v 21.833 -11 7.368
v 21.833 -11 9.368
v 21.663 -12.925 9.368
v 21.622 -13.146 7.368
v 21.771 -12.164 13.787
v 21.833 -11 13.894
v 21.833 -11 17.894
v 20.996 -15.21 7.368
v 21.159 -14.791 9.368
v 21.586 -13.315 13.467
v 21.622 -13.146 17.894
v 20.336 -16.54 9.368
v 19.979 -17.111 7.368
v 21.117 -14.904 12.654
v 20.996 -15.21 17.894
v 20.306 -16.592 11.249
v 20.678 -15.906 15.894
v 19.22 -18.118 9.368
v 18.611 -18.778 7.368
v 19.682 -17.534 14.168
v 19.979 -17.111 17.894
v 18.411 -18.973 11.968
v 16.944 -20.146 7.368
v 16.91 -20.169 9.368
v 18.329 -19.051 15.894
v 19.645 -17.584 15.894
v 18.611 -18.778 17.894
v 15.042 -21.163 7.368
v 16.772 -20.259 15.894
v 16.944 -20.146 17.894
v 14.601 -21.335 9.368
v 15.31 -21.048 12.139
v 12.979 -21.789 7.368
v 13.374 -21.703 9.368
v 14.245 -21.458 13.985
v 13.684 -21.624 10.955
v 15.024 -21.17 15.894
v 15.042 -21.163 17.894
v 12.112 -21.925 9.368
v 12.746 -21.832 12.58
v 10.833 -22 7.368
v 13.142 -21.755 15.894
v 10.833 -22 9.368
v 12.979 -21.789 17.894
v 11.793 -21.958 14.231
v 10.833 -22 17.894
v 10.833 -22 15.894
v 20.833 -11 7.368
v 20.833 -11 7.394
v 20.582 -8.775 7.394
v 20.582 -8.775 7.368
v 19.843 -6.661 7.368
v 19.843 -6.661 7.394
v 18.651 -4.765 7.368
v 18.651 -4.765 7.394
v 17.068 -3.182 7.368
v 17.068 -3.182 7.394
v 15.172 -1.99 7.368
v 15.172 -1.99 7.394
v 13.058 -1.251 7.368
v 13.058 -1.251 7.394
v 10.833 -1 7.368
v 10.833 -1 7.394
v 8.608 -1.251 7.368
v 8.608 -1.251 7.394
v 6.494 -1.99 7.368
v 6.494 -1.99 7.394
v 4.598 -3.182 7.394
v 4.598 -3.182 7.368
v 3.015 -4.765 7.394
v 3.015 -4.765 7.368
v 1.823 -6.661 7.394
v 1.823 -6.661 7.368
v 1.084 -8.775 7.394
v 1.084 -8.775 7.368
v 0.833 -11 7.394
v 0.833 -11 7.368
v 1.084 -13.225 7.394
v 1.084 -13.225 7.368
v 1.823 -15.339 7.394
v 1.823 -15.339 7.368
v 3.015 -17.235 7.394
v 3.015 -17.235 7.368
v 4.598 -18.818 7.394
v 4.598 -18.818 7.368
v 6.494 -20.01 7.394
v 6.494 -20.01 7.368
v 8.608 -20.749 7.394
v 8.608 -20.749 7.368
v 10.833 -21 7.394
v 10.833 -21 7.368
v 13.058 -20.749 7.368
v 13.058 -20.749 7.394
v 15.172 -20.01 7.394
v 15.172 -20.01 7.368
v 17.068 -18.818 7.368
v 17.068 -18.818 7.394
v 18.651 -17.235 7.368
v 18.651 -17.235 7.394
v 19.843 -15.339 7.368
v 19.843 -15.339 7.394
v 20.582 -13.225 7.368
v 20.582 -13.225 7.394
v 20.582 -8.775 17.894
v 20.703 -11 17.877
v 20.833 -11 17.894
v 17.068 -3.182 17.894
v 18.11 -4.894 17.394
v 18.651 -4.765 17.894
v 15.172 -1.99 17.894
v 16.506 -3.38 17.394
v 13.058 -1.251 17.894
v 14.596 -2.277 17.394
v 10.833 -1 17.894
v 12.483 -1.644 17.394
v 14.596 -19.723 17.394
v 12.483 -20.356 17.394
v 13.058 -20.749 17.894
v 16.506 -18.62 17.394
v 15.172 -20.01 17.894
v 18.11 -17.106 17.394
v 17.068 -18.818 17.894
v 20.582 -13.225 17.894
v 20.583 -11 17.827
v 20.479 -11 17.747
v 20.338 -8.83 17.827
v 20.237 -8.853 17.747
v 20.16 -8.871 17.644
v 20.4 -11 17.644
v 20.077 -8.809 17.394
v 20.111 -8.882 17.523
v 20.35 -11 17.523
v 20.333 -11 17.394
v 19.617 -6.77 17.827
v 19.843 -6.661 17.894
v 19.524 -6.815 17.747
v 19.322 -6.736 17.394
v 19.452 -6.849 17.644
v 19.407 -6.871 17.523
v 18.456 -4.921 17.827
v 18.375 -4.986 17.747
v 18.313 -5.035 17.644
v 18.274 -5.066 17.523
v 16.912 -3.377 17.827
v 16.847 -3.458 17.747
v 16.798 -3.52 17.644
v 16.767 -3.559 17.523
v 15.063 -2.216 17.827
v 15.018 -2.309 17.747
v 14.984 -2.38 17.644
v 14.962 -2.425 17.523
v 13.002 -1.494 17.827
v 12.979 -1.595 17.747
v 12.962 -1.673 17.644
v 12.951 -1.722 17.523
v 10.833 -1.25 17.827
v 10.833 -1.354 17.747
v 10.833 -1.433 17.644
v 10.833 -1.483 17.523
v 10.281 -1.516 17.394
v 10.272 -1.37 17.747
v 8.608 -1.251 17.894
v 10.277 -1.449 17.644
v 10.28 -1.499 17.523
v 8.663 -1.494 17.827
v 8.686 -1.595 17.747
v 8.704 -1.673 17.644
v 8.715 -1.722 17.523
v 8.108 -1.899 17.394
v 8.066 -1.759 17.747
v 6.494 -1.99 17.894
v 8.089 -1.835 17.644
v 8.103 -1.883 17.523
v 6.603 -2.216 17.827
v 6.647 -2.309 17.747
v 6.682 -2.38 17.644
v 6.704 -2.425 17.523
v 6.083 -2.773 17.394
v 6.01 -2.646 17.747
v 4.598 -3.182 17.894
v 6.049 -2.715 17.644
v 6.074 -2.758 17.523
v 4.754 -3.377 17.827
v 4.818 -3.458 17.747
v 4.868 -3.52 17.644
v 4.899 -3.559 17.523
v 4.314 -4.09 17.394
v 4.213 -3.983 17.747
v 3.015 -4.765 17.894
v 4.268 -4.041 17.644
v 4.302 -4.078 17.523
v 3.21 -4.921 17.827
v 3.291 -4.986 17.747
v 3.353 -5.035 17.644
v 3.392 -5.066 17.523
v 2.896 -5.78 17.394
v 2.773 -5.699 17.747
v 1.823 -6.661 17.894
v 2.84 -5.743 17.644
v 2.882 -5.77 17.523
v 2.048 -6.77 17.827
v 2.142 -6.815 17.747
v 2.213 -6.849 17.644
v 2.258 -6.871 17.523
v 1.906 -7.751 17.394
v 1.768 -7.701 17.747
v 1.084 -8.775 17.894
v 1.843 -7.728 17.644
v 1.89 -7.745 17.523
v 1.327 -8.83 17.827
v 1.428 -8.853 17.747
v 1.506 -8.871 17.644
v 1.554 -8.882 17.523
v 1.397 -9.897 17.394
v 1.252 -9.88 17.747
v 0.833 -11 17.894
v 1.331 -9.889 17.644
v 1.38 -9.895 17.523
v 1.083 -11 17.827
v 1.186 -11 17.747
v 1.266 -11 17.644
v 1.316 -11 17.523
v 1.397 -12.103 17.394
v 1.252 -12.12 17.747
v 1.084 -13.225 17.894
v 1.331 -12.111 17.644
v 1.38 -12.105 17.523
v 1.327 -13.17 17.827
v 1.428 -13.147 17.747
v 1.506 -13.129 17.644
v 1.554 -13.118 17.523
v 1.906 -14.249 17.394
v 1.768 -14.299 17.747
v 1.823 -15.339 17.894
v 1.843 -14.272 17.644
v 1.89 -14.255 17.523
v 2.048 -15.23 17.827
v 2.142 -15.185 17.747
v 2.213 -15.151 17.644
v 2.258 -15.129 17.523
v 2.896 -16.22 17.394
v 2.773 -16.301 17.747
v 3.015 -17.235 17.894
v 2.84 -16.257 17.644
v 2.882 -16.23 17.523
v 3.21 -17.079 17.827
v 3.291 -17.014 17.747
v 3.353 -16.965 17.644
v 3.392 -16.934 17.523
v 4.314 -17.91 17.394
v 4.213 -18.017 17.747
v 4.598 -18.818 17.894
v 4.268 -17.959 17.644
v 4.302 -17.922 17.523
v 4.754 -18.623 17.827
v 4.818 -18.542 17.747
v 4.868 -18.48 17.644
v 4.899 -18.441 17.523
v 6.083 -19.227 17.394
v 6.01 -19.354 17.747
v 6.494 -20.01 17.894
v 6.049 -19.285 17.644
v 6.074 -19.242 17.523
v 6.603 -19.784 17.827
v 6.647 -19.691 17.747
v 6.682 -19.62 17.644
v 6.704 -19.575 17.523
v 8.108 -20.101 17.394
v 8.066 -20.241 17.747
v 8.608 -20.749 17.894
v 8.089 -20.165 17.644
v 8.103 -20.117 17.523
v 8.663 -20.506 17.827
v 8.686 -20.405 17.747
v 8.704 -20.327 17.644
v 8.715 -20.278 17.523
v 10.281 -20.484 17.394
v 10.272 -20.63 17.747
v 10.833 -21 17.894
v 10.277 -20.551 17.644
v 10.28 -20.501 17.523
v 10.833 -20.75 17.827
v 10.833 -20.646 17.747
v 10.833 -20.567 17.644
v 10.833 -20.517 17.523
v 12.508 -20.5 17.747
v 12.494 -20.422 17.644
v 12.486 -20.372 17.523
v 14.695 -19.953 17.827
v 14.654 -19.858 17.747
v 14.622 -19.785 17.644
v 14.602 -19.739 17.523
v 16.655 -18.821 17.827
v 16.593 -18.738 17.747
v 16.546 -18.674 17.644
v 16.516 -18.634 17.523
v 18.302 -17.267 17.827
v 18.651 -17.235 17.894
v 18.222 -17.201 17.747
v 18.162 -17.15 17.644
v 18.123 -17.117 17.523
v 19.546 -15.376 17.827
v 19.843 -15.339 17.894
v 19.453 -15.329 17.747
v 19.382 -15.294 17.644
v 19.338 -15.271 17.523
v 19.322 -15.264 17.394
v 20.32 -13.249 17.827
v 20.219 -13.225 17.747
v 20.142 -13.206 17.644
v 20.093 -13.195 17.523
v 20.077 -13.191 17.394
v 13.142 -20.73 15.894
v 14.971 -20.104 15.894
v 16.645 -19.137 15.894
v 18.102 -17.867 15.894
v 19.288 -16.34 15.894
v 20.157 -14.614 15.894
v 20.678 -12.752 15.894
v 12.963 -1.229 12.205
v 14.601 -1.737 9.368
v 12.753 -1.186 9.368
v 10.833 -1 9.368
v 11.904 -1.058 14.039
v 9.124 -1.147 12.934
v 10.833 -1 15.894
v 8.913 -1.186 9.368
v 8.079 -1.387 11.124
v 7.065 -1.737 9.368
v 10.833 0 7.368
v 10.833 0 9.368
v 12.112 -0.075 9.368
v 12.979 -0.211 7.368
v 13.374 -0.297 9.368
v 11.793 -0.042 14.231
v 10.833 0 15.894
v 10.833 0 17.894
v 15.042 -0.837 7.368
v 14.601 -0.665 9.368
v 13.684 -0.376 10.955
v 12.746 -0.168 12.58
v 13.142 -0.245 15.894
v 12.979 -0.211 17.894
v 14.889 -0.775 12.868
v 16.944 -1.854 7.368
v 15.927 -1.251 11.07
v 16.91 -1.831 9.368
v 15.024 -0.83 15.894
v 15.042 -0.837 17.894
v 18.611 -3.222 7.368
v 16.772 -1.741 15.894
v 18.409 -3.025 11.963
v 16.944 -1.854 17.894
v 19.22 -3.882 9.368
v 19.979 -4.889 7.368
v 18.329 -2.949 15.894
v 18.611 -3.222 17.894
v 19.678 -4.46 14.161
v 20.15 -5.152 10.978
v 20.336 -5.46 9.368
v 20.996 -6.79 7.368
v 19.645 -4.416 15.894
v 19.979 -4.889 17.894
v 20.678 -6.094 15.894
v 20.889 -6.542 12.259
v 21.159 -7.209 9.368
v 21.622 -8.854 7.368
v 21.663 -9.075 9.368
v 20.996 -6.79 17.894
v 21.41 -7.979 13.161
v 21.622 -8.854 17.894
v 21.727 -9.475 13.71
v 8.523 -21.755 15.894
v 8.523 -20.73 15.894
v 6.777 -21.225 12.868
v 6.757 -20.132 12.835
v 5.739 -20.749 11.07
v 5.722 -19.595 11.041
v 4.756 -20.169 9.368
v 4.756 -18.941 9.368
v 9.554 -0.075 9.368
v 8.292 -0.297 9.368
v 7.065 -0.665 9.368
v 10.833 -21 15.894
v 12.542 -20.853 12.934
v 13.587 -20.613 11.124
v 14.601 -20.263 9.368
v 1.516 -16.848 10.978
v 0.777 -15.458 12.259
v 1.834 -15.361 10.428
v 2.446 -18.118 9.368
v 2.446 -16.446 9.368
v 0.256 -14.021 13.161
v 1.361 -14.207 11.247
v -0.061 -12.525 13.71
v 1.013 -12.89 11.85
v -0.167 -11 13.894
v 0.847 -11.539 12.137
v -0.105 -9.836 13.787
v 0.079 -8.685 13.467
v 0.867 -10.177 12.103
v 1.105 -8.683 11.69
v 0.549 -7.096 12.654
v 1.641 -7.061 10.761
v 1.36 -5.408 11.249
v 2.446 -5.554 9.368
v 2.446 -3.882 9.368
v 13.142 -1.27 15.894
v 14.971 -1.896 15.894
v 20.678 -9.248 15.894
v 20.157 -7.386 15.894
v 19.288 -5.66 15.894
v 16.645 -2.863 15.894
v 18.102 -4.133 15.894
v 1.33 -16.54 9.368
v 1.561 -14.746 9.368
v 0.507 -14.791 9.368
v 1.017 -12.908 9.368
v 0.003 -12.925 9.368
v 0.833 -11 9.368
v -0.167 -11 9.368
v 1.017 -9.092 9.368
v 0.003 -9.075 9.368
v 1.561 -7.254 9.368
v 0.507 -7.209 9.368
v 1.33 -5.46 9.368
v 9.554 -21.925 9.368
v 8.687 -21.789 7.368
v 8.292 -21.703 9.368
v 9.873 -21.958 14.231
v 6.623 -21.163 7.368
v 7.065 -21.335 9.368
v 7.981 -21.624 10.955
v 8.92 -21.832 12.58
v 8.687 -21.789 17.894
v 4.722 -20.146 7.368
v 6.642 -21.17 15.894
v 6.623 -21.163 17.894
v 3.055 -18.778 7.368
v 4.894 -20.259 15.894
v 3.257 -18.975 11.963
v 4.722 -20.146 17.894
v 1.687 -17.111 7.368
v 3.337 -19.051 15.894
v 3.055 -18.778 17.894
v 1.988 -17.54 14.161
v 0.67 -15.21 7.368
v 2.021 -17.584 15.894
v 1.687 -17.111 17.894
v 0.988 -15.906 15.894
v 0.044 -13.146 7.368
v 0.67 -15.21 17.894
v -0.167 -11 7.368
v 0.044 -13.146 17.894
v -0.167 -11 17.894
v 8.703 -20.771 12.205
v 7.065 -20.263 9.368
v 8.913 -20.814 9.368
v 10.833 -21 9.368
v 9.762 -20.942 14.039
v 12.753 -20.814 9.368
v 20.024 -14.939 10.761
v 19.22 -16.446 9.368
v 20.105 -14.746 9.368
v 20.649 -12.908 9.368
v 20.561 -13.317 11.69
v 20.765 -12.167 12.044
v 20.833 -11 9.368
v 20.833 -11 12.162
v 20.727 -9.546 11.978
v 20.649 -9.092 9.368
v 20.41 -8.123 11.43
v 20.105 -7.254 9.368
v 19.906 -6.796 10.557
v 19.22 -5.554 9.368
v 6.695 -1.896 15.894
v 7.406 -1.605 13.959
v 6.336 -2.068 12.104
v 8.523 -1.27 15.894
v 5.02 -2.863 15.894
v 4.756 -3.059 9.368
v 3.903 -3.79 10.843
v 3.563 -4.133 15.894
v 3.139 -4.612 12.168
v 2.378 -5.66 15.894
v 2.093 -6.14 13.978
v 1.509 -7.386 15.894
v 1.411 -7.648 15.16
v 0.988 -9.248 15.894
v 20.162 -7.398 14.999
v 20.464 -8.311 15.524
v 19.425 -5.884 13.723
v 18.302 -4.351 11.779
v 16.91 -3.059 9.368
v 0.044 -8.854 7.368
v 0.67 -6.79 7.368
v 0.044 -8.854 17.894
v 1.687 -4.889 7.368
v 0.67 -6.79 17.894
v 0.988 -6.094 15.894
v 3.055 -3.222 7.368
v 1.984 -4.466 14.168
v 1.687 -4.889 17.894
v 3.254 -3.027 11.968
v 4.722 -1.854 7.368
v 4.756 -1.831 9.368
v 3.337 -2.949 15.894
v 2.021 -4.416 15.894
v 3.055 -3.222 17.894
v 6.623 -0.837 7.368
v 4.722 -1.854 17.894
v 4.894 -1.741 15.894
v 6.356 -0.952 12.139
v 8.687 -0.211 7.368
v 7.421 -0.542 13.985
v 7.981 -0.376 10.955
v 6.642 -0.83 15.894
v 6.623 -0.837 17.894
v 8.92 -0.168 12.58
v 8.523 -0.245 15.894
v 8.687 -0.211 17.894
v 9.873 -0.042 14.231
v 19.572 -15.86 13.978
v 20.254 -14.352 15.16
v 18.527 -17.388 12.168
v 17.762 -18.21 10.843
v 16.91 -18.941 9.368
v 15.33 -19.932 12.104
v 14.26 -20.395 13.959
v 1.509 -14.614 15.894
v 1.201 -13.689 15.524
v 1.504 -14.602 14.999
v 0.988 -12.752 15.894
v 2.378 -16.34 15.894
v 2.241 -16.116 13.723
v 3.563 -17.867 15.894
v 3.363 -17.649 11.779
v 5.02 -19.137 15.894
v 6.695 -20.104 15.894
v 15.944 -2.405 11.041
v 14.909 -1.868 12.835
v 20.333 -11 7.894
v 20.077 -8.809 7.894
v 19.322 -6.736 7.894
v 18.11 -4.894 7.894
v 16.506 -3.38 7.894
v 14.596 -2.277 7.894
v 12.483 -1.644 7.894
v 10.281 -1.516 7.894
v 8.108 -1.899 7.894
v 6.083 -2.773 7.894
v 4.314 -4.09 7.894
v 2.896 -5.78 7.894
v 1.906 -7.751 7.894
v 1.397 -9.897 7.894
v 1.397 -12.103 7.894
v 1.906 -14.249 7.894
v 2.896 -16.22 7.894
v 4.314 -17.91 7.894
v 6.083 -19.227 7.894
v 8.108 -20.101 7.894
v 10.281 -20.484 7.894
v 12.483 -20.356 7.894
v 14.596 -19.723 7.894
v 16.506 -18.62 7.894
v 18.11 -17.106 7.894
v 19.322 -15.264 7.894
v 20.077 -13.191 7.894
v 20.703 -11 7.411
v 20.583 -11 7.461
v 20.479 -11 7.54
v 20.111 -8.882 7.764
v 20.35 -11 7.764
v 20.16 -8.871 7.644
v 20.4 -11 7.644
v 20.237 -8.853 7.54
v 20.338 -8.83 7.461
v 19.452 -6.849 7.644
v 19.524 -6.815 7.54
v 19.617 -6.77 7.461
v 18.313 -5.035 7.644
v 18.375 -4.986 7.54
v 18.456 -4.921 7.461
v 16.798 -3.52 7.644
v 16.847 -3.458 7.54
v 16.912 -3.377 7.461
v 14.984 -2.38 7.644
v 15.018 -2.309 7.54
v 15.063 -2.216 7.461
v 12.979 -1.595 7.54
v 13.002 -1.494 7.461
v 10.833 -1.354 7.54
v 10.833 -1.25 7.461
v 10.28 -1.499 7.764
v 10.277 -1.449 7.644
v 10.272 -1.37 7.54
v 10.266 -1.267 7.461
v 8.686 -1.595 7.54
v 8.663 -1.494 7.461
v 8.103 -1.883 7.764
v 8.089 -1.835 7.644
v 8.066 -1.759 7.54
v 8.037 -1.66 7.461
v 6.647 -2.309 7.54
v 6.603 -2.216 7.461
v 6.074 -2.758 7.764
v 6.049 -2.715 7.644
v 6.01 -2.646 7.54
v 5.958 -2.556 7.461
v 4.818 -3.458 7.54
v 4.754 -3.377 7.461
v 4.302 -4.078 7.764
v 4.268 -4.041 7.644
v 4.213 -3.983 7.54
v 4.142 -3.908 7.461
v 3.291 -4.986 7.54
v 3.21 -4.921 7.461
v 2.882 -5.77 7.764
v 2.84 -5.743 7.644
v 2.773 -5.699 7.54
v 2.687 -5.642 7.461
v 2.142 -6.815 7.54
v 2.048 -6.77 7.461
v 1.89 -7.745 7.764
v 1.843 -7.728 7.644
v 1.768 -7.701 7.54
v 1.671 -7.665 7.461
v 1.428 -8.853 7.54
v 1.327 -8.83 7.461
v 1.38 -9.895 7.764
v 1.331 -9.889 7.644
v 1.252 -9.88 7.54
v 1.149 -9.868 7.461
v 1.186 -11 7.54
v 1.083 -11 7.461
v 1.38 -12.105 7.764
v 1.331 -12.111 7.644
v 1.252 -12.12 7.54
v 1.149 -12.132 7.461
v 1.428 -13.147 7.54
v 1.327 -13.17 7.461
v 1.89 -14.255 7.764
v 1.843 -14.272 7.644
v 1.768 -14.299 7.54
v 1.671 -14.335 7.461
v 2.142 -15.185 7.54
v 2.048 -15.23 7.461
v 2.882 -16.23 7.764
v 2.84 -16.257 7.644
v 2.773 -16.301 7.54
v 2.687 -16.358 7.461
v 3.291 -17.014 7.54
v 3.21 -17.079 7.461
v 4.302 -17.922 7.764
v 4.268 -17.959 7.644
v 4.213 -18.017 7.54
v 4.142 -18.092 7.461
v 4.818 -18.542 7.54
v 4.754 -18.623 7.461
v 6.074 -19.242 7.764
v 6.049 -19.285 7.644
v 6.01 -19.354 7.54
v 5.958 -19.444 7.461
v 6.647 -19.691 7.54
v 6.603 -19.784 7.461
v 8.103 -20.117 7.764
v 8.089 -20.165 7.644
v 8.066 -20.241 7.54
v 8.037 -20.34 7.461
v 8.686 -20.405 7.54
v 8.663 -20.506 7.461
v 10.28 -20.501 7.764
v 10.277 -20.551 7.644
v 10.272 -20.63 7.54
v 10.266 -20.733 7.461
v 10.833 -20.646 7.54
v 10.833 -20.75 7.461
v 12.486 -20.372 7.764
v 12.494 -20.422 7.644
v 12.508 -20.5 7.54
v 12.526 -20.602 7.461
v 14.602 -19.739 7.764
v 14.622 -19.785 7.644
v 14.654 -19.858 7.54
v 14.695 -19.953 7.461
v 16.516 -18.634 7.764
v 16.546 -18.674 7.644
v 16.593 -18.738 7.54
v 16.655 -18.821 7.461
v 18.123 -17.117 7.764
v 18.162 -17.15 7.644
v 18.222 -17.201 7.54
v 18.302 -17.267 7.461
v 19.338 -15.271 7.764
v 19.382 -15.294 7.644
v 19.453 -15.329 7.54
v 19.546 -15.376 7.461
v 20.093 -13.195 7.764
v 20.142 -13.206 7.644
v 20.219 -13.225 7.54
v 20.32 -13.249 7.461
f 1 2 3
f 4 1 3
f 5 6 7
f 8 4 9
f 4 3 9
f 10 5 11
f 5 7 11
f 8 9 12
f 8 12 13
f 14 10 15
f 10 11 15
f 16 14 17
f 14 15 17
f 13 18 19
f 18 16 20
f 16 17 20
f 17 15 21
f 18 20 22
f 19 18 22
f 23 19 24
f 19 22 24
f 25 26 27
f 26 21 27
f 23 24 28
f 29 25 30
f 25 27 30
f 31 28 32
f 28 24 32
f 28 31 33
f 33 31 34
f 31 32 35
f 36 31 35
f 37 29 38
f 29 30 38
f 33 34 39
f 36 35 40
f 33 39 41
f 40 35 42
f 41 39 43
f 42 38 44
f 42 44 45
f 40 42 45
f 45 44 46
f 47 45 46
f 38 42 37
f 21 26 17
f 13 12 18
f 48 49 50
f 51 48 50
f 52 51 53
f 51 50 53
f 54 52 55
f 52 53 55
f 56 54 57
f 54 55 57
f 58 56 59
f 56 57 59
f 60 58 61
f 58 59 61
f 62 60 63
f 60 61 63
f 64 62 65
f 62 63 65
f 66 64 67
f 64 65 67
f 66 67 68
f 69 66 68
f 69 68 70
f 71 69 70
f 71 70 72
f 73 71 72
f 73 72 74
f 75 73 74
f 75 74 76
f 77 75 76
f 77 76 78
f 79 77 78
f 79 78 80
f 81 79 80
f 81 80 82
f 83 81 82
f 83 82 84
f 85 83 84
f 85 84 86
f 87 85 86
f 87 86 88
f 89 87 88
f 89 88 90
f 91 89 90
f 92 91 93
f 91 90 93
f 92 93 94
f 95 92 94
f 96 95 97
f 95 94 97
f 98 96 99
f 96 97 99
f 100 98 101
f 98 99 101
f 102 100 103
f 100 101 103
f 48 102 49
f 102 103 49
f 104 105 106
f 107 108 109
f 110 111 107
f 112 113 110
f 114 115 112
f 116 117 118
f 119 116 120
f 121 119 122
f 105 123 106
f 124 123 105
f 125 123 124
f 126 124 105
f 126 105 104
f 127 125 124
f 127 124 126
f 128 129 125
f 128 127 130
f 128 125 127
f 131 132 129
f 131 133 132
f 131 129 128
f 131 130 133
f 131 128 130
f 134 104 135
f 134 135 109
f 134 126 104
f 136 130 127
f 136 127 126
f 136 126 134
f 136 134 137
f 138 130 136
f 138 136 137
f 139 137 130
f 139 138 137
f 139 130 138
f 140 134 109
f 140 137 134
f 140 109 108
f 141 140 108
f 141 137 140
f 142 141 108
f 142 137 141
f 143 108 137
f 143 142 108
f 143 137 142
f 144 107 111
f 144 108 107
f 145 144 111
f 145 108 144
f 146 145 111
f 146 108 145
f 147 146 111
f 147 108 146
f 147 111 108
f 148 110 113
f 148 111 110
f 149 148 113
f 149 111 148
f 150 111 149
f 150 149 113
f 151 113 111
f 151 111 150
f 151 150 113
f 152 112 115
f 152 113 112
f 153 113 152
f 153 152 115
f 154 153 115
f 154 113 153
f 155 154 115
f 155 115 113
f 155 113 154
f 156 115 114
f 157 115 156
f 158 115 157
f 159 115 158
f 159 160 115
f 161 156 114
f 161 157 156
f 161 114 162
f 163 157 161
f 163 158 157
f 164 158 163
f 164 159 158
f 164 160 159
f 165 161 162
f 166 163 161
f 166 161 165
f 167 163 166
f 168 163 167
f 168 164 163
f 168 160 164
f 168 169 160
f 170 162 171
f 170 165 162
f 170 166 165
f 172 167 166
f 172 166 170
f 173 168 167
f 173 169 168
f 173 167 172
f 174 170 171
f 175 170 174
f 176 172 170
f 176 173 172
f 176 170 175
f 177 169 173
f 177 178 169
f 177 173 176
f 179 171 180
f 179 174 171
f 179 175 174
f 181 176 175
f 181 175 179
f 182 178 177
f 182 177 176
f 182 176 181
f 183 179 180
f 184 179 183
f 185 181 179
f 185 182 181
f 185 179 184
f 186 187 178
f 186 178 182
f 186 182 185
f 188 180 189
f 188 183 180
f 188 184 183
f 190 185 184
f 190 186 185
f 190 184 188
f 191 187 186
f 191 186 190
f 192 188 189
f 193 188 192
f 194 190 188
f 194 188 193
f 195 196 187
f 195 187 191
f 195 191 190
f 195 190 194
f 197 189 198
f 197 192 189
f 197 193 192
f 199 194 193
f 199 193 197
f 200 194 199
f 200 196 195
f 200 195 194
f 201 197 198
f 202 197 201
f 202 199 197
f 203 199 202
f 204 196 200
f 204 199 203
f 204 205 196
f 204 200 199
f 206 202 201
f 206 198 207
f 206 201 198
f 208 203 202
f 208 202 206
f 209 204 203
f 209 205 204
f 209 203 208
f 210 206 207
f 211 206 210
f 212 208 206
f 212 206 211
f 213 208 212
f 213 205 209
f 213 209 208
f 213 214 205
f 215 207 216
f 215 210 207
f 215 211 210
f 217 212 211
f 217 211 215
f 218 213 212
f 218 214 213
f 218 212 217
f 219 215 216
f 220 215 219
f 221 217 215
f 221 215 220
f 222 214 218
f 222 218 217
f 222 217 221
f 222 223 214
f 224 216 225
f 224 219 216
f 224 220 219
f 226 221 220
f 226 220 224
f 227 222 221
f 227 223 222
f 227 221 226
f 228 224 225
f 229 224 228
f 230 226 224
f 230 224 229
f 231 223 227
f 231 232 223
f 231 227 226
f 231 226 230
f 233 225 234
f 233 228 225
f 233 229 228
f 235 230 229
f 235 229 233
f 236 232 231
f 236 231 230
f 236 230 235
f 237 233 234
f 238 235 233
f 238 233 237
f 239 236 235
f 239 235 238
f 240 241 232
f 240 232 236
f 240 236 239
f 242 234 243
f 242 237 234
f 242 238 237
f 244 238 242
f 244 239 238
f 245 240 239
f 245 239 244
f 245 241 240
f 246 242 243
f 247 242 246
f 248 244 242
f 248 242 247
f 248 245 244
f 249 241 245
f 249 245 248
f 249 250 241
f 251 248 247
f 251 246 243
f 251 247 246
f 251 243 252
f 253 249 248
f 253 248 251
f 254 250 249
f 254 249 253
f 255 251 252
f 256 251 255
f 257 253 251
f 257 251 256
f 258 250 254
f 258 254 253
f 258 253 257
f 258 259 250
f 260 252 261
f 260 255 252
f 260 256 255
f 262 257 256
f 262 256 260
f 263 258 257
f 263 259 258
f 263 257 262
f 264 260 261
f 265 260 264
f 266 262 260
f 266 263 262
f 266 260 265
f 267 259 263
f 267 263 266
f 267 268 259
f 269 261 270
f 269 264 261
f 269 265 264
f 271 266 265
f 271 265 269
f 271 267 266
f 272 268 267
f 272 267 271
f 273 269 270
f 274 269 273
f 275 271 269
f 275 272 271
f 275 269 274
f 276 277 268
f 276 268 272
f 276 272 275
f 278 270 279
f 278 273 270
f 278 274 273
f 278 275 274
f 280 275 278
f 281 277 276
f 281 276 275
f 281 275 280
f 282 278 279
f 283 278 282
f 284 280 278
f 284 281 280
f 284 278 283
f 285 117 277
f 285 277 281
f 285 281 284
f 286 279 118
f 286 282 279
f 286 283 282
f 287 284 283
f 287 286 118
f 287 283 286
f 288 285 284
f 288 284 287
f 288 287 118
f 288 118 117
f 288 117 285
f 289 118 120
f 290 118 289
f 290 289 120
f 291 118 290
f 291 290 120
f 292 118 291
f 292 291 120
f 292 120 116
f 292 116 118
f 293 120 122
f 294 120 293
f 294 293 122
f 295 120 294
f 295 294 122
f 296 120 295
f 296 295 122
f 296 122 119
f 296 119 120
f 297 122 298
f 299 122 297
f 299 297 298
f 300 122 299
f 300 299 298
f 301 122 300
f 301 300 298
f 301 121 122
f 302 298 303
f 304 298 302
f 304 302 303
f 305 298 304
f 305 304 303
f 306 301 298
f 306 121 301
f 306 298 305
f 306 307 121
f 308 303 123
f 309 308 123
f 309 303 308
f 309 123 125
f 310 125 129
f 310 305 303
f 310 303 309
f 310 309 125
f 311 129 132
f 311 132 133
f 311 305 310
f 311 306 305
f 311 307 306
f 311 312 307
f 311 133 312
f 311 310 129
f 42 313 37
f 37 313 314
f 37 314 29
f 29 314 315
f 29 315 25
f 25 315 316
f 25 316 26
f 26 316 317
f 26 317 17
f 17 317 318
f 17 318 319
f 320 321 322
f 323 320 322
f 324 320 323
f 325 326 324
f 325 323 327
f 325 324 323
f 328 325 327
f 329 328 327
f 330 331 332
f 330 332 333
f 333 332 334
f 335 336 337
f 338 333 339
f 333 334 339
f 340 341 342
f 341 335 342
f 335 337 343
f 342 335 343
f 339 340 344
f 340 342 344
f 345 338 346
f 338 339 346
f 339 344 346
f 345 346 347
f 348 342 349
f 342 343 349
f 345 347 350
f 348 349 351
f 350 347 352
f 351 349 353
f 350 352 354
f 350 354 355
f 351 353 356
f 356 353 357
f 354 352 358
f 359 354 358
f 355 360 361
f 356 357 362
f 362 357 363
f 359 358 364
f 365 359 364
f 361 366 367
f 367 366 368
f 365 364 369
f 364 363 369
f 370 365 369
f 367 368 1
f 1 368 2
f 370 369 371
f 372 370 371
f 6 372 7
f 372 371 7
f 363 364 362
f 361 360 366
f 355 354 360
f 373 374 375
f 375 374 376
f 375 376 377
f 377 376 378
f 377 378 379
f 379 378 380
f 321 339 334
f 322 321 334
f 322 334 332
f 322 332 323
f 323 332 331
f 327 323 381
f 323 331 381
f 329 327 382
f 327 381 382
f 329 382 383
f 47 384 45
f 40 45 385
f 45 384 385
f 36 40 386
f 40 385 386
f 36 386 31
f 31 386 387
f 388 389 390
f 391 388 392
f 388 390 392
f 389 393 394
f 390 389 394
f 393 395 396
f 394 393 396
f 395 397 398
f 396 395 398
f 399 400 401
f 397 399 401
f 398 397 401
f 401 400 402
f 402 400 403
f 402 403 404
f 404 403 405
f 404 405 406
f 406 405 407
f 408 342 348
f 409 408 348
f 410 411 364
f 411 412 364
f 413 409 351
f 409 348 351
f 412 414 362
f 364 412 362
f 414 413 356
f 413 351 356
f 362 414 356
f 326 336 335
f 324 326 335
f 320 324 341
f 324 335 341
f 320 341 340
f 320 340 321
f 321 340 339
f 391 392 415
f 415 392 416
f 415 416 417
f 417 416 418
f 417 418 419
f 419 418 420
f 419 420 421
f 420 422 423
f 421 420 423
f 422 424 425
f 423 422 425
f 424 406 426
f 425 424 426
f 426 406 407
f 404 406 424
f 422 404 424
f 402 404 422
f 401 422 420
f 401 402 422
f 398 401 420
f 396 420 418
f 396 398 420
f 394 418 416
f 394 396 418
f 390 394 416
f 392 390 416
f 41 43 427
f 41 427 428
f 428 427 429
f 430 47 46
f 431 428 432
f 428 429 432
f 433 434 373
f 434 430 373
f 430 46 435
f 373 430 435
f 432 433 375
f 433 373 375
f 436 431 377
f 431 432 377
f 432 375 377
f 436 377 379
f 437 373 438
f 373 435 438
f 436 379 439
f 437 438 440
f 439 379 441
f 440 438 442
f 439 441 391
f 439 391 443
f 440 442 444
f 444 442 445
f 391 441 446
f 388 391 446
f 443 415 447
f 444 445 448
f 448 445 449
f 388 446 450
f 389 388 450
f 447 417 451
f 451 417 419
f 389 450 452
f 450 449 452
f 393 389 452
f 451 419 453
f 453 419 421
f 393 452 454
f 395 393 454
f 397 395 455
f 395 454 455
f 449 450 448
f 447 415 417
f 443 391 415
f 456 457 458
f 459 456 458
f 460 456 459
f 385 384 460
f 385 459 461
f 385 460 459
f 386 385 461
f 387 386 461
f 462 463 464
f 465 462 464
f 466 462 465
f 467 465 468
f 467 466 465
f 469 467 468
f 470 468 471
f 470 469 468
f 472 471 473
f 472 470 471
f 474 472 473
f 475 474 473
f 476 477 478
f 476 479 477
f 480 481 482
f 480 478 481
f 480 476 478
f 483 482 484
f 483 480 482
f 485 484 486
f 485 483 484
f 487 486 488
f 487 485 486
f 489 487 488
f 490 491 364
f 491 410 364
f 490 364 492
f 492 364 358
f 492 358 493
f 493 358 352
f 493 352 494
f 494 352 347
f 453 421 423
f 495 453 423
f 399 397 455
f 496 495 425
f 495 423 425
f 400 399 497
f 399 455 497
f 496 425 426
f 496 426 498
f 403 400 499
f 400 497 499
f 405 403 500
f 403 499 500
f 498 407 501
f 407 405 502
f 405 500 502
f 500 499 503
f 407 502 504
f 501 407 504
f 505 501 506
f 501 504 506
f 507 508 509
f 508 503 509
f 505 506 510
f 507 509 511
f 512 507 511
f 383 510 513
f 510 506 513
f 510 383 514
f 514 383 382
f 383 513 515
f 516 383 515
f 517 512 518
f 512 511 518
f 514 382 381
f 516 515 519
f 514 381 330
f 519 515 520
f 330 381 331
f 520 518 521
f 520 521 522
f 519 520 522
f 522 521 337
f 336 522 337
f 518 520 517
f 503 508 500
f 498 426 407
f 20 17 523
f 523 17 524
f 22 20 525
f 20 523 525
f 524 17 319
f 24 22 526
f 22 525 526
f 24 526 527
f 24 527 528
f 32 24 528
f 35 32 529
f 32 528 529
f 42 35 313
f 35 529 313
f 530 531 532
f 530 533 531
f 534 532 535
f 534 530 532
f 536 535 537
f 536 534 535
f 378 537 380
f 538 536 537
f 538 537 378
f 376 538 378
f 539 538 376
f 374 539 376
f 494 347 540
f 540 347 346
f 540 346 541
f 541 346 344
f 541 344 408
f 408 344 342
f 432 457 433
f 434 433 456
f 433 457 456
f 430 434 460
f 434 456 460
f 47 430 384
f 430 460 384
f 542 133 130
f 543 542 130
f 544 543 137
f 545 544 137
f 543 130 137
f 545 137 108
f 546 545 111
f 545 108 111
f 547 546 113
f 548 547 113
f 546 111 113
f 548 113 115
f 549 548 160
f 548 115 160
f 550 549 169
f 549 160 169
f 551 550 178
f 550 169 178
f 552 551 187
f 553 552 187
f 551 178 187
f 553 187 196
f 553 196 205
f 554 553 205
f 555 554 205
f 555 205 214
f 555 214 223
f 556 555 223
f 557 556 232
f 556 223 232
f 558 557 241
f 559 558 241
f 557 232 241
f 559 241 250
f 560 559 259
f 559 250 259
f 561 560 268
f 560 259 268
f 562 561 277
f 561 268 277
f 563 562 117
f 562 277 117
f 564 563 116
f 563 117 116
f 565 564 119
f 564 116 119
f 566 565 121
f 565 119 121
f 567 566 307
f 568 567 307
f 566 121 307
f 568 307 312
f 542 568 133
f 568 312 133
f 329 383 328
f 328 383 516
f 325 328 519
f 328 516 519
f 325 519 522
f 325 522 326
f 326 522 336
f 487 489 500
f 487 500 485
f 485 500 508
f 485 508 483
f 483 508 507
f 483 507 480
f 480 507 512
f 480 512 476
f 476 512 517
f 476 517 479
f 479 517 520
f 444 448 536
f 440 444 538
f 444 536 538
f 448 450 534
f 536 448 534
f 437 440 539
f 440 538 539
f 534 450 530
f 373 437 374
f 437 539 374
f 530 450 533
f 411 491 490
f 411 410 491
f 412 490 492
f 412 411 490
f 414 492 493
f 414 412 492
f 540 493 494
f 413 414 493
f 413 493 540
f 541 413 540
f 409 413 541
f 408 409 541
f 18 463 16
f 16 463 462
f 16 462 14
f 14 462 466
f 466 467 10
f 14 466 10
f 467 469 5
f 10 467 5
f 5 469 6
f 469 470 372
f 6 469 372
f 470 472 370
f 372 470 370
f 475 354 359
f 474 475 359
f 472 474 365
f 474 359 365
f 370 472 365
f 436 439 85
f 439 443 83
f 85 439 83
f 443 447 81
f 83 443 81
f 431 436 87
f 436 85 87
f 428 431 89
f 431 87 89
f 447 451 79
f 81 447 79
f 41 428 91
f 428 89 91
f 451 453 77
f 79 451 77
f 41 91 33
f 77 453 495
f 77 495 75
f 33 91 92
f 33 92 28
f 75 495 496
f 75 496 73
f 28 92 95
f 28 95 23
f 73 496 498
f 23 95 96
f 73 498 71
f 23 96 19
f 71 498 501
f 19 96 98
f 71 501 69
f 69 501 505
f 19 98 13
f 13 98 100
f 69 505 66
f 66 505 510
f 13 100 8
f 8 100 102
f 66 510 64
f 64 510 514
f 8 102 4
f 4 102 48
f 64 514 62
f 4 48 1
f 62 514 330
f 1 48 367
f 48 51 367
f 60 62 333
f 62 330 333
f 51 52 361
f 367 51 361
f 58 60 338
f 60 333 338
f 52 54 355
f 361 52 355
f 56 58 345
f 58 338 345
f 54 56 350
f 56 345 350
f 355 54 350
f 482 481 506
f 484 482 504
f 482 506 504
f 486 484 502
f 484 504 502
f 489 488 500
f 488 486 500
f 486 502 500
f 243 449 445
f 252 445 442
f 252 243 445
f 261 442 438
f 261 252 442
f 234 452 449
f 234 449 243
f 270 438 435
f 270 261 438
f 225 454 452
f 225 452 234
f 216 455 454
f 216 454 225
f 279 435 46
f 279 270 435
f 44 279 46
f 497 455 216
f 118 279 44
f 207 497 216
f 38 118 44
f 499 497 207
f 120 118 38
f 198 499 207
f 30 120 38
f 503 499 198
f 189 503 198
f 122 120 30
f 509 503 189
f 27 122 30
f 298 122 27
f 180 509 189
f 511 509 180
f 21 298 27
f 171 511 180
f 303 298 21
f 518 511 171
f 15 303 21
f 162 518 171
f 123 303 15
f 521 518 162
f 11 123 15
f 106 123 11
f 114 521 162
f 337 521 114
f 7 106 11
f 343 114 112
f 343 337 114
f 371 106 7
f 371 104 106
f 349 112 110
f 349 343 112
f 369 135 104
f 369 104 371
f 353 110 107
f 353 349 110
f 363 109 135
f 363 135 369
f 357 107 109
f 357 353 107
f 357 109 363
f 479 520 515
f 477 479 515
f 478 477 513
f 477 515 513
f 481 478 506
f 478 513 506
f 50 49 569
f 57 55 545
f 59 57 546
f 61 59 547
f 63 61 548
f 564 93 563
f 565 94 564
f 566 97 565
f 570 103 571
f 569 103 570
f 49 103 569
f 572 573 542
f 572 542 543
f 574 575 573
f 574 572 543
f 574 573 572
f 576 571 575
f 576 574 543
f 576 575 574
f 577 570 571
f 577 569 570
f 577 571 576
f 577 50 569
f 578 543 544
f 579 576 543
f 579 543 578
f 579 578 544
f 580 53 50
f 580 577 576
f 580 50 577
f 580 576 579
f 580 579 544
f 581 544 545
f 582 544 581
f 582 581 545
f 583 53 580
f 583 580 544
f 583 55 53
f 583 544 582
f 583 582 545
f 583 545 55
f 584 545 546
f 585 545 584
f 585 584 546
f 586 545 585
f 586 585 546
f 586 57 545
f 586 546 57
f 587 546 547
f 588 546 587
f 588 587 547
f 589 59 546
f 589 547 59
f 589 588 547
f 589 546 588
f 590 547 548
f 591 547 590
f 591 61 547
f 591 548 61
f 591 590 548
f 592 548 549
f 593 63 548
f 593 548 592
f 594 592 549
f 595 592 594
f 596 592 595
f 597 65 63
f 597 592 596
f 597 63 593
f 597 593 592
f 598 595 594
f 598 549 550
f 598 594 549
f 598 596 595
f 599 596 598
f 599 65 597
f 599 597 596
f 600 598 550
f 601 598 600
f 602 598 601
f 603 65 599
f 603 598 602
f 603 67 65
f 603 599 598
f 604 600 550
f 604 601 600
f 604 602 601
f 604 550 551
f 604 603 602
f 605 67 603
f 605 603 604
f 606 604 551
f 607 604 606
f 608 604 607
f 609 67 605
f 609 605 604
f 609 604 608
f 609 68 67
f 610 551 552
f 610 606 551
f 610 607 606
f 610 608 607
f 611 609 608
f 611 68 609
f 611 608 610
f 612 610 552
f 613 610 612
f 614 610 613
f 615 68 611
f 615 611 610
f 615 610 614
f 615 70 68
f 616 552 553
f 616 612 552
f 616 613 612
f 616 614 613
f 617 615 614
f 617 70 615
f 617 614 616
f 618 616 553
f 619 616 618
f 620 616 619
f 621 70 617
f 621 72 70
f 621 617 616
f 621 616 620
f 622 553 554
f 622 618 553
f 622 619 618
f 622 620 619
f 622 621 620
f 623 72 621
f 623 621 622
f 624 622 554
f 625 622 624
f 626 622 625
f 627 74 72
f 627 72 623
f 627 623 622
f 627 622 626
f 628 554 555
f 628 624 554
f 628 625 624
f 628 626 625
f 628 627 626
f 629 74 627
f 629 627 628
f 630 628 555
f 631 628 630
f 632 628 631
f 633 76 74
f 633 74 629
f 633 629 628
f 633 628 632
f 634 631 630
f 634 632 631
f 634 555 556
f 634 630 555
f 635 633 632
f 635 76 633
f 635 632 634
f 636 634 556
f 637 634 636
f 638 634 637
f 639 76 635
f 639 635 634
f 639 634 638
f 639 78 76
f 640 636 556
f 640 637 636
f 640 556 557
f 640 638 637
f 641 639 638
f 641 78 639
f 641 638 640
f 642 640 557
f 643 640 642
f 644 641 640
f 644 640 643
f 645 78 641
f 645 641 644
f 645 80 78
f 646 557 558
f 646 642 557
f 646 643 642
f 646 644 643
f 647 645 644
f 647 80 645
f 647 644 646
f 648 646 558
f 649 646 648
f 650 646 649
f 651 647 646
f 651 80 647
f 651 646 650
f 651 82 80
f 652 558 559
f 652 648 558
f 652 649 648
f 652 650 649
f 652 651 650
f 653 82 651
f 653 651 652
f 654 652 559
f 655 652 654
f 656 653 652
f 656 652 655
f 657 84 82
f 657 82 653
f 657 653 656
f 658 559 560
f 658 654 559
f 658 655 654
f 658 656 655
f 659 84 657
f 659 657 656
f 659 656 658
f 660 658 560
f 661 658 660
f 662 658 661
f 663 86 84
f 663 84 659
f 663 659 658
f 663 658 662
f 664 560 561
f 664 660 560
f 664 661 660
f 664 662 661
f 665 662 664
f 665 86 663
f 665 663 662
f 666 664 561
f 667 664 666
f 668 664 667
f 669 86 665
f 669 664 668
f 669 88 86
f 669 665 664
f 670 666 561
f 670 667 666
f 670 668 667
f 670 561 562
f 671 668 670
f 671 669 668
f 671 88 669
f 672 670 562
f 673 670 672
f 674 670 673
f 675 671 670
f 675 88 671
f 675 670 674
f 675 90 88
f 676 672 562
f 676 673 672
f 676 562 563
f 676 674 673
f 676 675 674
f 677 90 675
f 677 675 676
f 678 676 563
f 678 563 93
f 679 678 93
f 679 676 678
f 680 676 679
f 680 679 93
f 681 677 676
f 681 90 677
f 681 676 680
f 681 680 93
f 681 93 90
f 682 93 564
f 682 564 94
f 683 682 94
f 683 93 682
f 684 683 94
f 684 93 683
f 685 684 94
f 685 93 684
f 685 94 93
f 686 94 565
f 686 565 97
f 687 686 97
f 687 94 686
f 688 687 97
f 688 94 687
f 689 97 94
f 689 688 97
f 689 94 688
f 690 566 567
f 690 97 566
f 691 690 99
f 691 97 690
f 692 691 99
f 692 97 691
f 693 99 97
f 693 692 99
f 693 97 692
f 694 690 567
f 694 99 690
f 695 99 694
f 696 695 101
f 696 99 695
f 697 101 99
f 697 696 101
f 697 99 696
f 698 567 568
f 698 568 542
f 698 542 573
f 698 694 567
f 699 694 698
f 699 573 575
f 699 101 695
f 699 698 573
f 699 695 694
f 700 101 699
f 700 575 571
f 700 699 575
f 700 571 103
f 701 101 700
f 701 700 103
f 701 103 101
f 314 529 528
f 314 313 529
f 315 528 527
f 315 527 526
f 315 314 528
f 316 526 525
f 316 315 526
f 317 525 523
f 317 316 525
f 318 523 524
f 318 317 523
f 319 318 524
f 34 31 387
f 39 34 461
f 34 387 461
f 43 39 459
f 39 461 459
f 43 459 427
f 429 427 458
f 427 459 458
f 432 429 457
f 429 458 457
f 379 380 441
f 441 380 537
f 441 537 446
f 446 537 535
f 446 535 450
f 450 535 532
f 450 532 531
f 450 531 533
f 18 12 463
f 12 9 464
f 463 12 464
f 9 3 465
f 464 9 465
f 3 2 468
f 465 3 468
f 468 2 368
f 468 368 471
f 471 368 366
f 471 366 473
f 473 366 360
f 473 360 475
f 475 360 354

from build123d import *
from build123d import SkipClean  # not in build123d's __all__

# Parameters (mm, degrees)
F1_DEPTH = 22
F2_R     = 10
F2_R_2   = 9.5
F3_DEPTH = 25
F4_DEPTH = 10.5
F5_R     = 0.49999


# Not quite as in the source:
# - a fillet or chamfer is up to 0.001 mm smaller than in the source, because OpenCascade refuses the exact size


with BuildPart() as f1:
    # F0 (on Front) → F1 (new body)
    with BuildSketch(Plane.XZ):
        Polygon((-0.1671048567, 13.8939016994), (2.4461437974, 9.3676222578), (4.7555448741, 9.3676222578), (0.9875956817, 15.8939016994), (-0.1671048567, 15.8939016994), align=None)
        Polygon((0.9875956817, 15.8939016994), (8.5234940666, 15.8939016994), (9.678194605, 17.8939016994), (-0.1671048567, 17.8939016994), align=None)
        Polygon((9.678194605, 17.8939016994), (8.5234940666, 15.8939016994), (10.8328951433, 15.8939016994), align=None)
        Polygon((9.678194605, 17.8939016994), (10.8328951433, 15.8939016994), (11.9875956817, 17.8939016994), align=None)
        Polygon((11.9875956817, 17.8939016994), (10.8328951433, 15.8939016994), (13.1422962201, 15.8939016994), align=None)
        Polygon((-0.1671048567, 15.8939016994), (0.9875956817, 15.8939016994), (-0.1671048567, 17.8939016994), align=None)
        Polygon((13.1422962201, 15.8939016994), (20.678194605, 15.8939016994), (21.8328951433, 17.8939016994), (11.9875956817, 17.8939016994), align=None)
        Polygon((21.8328951433, 17.8939016994), (20.678194605, 15.8939016994), (21.8328951433, 15.8939016994), align=None)
        Polygon((20.678194605, 15.8939016994), (16.9102454125, 9.3676222578), (19.2196464893, 9.3676222578), (21.8328951433, 13.8939016994), (21.8328951433, 15.8939016994), align=None)
        Polygon((10.8328951433, 15.8939016994), (14.6008443358, 9.3676222578), (16.9102454125, 9.3676222578), (13.1422962201, 15.8939016994), align=None)
        Polygon((8.5234940666, 15.8939016994), (4.7555448741, 9.3676222578), (7.0649459509, 9.3676222578), (10.8328951433, 15.8939016994), align=None)
        Polygon((4.7555448741, 9.3676222578), (3.6008443358, 7.3676222578), (5.9102454125, 7.3676222578), align=None)
        Polygon((2.4461437974, 9.3676222578), (3.6008443358, 7.3676222578), (4.7555448741, 9.3676222578), align=None)
        Polygon((-0.1671048567, 9.3676222578), (-0.1671048567, 7.3676222578), (3.6008443358, 7.3676222578), (2.4461437974, 9.3676222578), align=None)
        Polygon((4.7555448741, 9.3676222578), (5.9102454125, 7.3676222578), (7.0649459509, 9.3676222578), align=None)
        Polygon((7.0649459509, 9.3676222578), (5.9102454125, 7.3676222578), (15.7555448741, 7.3676222578), (14.6008443358, 9.3676222578), align=None)
        Polygon((14.6008443358, 9.3676222578), (15.7555448741, 7.3676222578), (16.9102454125, 9.3676222578), align=None)
        Polygon((16.9102454125, 9.3676222578), (15.7555448741, 7.3676222578), (18.0649459509, 7.3676222578), align=None)
        Polygon((16.9102454125, 9.3676222578), (18.0649459509, 7.3676222578), (19.2196464893, 9.3676222578), align=None)
        Polygon((19.2196464893, 9.3676222578), (18.0649459509, 7.3676222578), (21.8328951433, 7.3676222578), (21.8328951433, 9.3676222578), align=None)
    extrude(amount=F1_DEPTH)

    # F2 (on face) → F3 (cut)
    with BuildSketch(Plane.XY.offset(17.8939016994)):
        with Locations((10.8328951433, -11)):
            Circle(F2_R)
        with Locations((10.8328951433, -11)):
            Circle(F2_R_2, mode=Mode.SUBTRACT)
        with Locations((10.8328951433, -11)):
            Circle(F2_R_2)
        with BuildLine():
            ThreePointArc((-0.1671048567, -11), (3.0547205503, -3.2218254069), (10.8328951433, 0))
            Line((10.8328951433, 0), (-0.1671048567, 0))
            Line((-0.1671048567, 0), (-0.1671048567, -11))
        make_face()
        with BuildLine():
            ThreePointArc((10.8328951433, 0), (18.6110697364, -3.2218254069), (21.8328951433, -11))
            Line((21.8328951433, -11), (21.8328951433, 0))
            Line((21.8328951433, 0), (10.8328951433, 0))
        make_face()
        with BuildLine():
            Line((21.8328951433, -22), (21.8328951433, -11))
            ThreePointArc((21.8328951433, -11), (18.6110697364, -18.7781745931), (10.8328951433, -22))
            Line((10.8328951433, -22), (21.8328951433, -22))
        make_face()
        with BuildLine():
            Line((-0.1671048567, -22), (10.8328951433, -22))
            ThreePointArc((10.8328951433, -22), (3.0547205503, -18.7781745931), (-0.1671048567, -11))
            Line((-0.1671048567, -11), (-0.1671048567, -22))
        make_face()
    with SkipClean():  # cleaning this boolean's faces spoils the solid; the shape is the same uncleaned
        extrude(amount=-F3_DEPTH, mode=Mode.SUBTRACT)

    # F2 (on face) → F4 (join)
    with BuildSketch(Plane.XY.offset(17.8939016994)):
        with Locations((10.8328951433, -11)):
            Circle(F2_R)
        with Locations((10.8328951433, -11)):
            Circle(F2_R_2, mode=Mode.SUBTRACT)
    with SkipClean():  # cleaning this boolean's faces spoils the solid; the shape is the same uncleaned
        extrude(amount=-F4_DEPTH)

    # F5 (radius 0.5 in the source; OpenCascade refuses exactly that, so slightly less here)
    f5_edges = [f1.edges().sort_by_distance(p)[0] for p in [
        (1.332895, -11, 7.393902),
        (1.332895, -11, 17.893902),
    ]]
    fillet(f5_edges, radius=F5_R)


solid = f1.part
